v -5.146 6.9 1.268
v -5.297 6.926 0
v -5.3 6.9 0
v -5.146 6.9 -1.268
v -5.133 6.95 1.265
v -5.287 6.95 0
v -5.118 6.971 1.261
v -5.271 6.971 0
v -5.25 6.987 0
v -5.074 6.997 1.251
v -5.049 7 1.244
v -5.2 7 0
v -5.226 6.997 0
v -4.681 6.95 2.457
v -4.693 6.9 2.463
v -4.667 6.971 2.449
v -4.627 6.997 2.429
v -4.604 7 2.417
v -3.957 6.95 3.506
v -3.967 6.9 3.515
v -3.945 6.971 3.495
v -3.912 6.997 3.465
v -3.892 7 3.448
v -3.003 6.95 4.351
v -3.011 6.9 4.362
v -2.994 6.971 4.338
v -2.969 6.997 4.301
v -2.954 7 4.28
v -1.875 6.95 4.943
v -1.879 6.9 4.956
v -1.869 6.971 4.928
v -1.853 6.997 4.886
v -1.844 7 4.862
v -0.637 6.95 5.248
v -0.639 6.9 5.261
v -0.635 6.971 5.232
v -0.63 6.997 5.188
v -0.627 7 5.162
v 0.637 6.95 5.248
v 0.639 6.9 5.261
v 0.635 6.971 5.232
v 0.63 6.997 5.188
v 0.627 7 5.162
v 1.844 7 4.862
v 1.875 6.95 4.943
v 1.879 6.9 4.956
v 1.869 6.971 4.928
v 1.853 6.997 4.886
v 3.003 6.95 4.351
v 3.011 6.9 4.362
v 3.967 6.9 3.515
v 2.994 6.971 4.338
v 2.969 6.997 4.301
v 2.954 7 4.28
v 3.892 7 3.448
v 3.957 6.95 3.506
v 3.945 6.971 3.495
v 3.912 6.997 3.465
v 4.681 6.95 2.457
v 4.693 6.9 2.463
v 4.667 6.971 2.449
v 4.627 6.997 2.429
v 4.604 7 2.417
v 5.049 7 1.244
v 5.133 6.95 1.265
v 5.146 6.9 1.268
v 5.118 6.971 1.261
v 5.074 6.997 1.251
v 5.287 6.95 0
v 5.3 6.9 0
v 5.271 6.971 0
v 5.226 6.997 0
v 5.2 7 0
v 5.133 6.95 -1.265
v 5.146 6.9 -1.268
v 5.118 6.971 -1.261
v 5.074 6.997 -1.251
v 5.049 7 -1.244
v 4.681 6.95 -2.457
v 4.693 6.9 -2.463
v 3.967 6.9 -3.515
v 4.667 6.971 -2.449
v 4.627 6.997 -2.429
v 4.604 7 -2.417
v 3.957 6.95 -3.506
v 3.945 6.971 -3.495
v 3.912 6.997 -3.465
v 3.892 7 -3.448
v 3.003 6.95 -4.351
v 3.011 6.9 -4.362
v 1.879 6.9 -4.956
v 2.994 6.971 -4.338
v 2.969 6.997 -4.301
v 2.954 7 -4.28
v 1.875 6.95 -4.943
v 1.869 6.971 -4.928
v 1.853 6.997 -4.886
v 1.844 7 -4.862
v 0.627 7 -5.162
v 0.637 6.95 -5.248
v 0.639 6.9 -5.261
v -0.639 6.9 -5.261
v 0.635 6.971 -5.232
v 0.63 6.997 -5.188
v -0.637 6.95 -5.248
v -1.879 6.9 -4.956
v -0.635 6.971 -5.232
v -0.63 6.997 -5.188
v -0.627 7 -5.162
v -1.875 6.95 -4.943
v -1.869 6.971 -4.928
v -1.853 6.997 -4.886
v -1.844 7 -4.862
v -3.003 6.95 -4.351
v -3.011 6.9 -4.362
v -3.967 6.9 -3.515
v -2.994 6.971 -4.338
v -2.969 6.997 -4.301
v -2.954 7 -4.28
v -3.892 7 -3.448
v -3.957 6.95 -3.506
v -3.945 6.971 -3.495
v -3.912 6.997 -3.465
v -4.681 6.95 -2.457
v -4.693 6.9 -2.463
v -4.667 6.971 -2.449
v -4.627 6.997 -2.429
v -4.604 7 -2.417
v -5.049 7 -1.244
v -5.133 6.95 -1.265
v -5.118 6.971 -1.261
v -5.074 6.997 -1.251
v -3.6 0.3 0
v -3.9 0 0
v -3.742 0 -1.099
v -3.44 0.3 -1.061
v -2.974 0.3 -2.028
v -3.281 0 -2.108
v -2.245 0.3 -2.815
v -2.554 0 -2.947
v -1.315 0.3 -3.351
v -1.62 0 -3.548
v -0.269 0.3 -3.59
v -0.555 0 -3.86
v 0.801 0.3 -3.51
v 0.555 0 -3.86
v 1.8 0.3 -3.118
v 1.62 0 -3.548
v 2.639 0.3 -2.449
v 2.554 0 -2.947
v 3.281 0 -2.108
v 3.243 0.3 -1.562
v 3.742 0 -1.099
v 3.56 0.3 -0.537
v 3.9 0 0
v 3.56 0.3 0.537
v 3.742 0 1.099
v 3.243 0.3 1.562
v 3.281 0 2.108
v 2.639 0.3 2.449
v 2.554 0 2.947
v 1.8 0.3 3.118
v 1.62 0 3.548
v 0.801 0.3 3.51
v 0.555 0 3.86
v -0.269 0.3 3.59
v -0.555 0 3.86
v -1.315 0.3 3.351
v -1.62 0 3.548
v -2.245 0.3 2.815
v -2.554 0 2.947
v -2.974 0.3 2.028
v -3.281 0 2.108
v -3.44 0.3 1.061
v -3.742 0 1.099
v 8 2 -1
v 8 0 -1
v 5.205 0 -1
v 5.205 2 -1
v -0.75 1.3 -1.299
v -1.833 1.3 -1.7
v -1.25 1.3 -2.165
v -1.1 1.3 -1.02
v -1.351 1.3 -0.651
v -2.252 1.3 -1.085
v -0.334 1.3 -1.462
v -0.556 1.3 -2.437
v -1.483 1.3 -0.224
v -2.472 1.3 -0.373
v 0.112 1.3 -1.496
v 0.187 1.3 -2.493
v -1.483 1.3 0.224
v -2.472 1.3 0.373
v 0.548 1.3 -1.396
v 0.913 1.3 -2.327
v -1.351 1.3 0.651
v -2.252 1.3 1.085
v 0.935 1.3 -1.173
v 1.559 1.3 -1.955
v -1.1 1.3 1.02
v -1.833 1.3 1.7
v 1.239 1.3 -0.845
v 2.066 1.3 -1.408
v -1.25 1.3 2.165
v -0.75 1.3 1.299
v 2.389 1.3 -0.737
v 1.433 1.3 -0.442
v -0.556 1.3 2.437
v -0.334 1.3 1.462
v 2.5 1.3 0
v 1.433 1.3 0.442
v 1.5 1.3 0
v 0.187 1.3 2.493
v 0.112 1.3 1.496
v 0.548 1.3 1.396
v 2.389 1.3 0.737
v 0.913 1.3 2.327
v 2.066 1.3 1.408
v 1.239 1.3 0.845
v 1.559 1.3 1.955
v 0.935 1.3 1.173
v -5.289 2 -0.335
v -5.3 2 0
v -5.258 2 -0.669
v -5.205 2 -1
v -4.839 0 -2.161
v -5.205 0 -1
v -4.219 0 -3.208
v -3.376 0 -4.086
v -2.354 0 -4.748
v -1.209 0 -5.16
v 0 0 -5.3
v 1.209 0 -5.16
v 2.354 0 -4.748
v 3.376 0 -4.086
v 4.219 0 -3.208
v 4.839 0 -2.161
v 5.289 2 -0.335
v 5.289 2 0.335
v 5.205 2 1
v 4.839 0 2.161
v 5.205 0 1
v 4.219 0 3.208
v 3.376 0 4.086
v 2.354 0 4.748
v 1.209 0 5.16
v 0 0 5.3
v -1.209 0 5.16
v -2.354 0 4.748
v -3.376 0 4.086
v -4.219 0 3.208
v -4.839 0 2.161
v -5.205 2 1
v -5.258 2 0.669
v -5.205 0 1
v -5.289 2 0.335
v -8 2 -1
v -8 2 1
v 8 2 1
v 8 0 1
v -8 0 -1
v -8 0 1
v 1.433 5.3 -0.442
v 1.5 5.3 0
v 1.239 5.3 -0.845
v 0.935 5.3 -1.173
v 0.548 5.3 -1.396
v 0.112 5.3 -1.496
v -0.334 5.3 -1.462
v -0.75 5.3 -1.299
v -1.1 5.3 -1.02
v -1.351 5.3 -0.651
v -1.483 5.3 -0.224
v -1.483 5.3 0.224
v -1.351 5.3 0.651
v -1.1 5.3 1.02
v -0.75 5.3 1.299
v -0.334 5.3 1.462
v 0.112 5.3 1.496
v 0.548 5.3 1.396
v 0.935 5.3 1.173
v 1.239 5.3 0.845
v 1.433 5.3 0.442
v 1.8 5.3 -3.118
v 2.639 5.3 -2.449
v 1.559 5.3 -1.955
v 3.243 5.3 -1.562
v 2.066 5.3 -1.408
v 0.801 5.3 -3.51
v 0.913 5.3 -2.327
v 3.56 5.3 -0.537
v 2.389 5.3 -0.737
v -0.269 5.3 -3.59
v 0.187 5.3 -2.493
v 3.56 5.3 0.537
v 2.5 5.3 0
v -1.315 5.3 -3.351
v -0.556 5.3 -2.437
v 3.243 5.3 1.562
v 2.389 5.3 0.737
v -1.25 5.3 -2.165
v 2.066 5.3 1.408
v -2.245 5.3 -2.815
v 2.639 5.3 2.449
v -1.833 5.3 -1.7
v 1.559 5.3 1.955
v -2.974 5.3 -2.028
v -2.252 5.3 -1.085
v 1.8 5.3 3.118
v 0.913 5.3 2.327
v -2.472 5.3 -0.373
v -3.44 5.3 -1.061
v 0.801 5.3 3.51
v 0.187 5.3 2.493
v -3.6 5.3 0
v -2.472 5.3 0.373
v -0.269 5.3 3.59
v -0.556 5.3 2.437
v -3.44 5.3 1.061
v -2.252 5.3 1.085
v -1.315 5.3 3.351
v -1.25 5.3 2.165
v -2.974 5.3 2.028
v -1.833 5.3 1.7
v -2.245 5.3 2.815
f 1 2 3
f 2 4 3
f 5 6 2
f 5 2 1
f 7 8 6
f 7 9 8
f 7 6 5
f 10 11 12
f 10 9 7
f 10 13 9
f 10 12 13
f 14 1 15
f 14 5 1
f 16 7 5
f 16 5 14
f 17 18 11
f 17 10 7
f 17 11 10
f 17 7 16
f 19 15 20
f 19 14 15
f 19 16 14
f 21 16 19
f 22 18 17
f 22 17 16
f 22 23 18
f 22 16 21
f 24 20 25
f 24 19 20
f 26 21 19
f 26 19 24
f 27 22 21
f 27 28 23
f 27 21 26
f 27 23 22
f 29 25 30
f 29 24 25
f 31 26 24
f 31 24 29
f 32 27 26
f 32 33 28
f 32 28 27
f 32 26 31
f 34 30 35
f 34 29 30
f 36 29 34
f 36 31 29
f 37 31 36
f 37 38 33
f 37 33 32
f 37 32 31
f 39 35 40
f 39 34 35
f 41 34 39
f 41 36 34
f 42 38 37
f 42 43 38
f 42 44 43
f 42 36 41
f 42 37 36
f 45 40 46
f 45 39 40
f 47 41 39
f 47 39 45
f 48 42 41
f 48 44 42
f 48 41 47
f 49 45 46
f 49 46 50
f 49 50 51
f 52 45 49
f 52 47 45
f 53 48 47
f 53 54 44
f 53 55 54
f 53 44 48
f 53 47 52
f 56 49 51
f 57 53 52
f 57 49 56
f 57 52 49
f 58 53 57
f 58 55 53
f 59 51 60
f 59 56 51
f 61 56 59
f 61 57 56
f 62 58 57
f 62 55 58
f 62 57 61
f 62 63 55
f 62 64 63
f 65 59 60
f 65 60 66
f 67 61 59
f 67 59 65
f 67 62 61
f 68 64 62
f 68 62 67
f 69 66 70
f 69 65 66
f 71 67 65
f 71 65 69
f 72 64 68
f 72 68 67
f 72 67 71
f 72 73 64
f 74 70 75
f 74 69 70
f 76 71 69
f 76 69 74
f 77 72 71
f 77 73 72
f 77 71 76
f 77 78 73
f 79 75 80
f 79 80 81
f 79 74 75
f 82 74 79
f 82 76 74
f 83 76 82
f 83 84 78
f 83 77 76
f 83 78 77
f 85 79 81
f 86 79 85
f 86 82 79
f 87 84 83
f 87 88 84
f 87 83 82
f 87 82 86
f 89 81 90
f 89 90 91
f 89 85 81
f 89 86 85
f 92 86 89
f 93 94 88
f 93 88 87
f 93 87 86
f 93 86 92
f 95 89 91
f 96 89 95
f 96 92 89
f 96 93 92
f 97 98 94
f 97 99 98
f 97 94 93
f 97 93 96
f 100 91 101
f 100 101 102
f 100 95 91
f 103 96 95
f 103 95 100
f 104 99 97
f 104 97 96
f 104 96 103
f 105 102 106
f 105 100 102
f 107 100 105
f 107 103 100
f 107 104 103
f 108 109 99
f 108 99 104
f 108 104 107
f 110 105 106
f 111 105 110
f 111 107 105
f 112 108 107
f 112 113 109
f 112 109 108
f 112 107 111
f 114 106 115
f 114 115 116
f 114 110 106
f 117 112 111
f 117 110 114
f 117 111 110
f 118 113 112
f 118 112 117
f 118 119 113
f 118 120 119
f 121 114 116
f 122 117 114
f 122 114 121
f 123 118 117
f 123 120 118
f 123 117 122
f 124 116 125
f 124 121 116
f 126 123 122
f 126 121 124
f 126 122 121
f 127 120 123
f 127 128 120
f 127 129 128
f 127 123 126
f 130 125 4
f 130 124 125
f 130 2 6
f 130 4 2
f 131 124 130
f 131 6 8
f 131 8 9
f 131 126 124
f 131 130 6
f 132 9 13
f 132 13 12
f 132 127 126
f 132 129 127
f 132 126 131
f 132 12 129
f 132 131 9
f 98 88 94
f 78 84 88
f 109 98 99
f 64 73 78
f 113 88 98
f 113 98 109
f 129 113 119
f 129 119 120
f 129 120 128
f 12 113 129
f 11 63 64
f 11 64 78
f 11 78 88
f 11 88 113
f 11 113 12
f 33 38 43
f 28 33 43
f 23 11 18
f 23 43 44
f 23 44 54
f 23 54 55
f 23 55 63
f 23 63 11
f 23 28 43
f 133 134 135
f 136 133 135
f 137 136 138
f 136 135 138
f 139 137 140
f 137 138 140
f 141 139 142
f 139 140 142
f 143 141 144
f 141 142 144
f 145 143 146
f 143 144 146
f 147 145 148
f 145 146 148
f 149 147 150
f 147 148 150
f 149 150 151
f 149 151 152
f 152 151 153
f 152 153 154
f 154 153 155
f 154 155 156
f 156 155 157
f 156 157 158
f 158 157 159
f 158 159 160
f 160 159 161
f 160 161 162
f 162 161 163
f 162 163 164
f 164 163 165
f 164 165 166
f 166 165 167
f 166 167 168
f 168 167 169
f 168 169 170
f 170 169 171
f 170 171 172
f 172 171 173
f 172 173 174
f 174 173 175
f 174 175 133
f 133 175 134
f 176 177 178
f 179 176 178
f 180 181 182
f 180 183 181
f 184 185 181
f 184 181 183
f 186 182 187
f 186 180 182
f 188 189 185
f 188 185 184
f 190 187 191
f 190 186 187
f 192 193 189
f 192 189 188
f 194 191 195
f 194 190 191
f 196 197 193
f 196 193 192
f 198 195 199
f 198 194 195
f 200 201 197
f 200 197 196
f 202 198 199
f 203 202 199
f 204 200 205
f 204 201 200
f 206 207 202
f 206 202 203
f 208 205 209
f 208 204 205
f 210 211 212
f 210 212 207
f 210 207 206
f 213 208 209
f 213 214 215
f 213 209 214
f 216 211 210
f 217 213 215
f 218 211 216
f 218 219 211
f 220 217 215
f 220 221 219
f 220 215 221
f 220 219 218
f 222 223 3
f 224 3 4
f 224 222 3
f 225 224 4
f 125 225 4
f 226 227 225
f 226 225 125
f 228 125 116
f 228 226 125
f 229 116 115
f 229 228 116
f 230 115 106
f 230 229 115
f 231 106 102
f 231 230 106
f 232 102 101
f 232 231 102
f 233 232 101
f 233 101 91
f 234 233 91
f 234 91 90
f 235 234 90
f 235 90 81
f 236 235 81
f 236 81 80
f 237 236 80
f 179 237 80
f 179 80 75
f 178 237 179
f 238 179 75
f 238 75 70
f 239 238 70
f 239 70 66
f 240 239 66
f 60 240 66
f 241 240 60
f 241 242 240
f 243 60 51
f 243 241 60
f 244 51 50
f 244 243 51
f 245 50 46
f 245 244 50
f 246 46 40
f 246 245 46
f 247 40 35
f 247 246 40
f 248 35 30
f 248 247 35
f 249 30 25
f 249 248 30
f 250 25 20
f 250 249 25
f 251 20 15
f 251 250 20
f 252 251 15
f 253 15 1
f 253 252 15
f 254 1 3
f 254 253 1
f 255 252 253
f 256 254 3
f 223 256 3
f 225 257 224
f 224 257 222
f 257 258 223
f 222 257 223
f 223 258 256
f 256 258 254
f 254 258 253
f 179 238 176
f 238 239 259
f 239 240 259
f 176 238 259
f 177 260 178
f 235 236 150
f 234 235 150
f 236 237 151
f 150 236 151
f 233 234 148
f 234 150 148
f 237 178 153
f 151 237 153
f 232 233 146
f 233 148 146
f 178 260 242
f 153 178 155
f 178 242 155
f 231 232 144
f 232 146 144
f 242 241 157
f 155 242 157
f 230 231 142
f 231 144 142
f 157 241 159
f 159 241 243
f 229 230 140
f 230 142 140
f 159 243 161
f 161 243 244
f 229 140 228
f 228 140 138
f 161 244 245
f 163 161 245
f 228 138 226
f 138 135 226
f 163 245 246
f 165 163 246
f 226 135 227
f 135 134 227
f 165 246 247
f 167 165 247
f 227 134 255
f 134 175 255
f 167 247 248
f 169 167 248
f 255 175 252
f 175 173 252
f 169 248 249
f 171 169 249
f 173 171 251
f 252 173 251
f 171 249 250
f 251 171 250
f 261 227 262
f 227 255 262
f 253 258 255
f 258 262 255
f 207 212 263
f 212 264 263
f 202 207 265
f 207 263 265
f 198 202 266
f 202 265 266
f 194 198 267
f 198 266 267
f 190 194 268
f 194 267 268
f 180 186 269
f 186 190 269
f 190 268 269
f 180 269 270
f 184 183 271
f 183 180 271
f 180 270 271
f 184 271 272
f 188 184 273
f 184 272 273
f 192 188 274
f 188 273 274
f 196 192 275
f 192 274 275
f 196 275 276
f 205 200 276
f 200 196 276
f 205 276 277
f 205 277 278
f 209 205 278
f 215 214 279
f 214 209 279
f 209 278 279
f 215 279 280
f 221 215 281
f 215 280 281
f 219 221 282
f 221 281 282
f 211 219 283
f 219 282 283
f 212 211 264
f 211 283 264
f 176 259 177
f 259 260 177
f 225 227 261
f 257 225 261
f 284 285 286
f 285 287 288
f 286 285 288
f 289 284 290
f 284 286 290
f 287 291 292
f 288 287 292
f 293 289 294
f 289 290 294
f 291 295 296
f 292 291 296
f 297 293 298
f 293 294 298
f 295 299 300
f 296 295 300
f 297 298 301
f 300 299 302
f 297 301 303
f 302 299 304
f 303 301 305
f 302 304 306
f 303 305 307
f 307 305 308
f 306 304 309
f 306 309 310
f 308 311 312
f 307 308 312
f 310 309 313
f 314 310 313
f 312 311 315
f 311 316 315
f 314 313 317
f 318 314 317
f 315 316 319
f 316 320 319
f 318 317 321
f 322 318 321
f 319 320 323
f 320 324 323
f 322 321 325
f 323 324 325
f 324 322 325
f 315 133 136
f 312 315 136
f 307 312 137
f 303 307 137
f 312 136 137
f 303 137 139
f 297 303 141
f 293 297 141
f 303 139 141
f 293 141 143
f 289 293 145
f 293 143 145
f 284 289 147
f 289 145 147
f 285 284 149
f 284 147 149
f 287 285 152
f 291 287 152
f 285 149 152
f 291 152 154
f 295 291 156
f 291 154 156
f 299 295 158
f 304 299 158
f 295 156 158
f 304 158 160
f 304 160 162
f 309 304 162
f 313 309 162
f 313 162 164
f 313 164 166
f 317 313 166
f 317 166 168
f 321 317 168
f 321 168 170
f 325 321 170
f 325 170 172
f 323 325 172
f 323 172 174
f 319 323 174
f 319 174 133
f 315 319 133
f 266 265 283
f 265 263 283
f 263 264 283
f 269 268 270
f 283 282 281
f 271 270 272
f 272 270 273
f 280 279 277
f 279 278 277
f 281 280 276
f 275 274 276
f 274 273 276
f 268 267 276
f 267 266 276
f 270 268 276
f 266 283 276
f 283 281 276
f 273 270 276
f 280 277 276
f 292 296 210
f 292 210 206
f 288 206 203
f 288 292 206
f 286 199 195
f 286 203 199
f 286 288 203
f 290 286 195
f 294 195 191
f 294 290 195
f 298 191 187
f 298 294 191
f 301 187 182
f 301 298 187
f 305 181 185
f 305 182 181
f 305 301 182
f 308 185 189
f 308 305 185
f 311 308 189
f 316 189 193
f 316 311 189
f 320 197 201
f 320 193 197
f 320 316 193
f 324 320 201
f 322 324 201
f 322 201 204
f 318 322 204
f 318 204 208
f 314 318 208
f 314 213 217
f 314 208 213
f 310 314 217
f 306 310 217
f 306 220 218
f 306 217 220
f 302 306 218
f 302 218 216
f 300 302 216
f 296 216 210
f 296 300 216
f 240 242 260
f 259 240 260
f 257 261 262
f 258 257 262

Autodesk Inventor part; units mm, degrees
ref_plane "YZ Plane" through (0, 0, 0) normal (1, 0, 0) x (0, 1, 0)
ref_plane "XZ Plane" through (0, 0, 0) normal (0, 1, 0) x (-1, 0, 0)
ref_plane "XY Plane" through (0, 0, 0) normal (0, 0, 1) x (1, 0, 0)
sketch "Esquisse1" plane through (0, 0, 0) normal (0, 1, 0) x (-1, 0, 0)
  circle A0 centre (0, 0) radius 5.3
  dimension "d0" = 10.6
extrude "Extrusion1" add sketch "Esquisse1" along normal blind 7
shell "Coque2" thickness 1.7 removed faces 1 at (-1.6995, 0, -1.9343)
sketch "Esquisse6" plane through (0, 5.3, 0) normal (0, -1, 0) x (1, 0, 0)
  circle A0 centre (0, 0) radius 2.5
  circle A1 centre (0, 0) radius 1.5
  dimension "d20" = 5
  dimension "d21" = 3
extrude "Extrusion4" add sketch "Esquisse6" along normal blind 4
sketch "Esquisse7" plane through (0, 0, 0) normal (0, -1, 0) x (1, 0, 0)
  line L0 (-8, 1) -> (-4.8, 1)
  line L1 (-4.8, 1) -> (-4.8, -1)
  line L2 (-4.8, -1) -> (-8, -1)
  line L3 (-8, -1) -> (-8, 1)
  line L4 (4.8, 1) -> (8, 1)
  line L5 (8, 1) -> (8, -1)
  line L6 (8, -1) -> (4.8, -1)
  line L7 (4.8, -1) -> (4.8, 1)
  point P0 (0, 0)
  dimension "d24" = 2
  dimension "d25" = 1
  dimension "d26" = 4.8
  dimension "d27" = 4.8
  dimension "d29" = 8
  dimension "d30" = 8
extrude "Extrusion5" add sketch "Esquisse7" against normal blind 2
fillet "Congé3" radius 0.1 1 edges at (5.3, 7, 0)
chamfer "Chanfrein1" distance 0.3 angle 45 1 edges at (3.6, 0, 0)
equation "\"d25\" = 0.5 * d24"
equation "\"d27\" = d26"
equation "\"d30\" = d29"
properties part number "Button-SNES" material "Plastique ABS"
